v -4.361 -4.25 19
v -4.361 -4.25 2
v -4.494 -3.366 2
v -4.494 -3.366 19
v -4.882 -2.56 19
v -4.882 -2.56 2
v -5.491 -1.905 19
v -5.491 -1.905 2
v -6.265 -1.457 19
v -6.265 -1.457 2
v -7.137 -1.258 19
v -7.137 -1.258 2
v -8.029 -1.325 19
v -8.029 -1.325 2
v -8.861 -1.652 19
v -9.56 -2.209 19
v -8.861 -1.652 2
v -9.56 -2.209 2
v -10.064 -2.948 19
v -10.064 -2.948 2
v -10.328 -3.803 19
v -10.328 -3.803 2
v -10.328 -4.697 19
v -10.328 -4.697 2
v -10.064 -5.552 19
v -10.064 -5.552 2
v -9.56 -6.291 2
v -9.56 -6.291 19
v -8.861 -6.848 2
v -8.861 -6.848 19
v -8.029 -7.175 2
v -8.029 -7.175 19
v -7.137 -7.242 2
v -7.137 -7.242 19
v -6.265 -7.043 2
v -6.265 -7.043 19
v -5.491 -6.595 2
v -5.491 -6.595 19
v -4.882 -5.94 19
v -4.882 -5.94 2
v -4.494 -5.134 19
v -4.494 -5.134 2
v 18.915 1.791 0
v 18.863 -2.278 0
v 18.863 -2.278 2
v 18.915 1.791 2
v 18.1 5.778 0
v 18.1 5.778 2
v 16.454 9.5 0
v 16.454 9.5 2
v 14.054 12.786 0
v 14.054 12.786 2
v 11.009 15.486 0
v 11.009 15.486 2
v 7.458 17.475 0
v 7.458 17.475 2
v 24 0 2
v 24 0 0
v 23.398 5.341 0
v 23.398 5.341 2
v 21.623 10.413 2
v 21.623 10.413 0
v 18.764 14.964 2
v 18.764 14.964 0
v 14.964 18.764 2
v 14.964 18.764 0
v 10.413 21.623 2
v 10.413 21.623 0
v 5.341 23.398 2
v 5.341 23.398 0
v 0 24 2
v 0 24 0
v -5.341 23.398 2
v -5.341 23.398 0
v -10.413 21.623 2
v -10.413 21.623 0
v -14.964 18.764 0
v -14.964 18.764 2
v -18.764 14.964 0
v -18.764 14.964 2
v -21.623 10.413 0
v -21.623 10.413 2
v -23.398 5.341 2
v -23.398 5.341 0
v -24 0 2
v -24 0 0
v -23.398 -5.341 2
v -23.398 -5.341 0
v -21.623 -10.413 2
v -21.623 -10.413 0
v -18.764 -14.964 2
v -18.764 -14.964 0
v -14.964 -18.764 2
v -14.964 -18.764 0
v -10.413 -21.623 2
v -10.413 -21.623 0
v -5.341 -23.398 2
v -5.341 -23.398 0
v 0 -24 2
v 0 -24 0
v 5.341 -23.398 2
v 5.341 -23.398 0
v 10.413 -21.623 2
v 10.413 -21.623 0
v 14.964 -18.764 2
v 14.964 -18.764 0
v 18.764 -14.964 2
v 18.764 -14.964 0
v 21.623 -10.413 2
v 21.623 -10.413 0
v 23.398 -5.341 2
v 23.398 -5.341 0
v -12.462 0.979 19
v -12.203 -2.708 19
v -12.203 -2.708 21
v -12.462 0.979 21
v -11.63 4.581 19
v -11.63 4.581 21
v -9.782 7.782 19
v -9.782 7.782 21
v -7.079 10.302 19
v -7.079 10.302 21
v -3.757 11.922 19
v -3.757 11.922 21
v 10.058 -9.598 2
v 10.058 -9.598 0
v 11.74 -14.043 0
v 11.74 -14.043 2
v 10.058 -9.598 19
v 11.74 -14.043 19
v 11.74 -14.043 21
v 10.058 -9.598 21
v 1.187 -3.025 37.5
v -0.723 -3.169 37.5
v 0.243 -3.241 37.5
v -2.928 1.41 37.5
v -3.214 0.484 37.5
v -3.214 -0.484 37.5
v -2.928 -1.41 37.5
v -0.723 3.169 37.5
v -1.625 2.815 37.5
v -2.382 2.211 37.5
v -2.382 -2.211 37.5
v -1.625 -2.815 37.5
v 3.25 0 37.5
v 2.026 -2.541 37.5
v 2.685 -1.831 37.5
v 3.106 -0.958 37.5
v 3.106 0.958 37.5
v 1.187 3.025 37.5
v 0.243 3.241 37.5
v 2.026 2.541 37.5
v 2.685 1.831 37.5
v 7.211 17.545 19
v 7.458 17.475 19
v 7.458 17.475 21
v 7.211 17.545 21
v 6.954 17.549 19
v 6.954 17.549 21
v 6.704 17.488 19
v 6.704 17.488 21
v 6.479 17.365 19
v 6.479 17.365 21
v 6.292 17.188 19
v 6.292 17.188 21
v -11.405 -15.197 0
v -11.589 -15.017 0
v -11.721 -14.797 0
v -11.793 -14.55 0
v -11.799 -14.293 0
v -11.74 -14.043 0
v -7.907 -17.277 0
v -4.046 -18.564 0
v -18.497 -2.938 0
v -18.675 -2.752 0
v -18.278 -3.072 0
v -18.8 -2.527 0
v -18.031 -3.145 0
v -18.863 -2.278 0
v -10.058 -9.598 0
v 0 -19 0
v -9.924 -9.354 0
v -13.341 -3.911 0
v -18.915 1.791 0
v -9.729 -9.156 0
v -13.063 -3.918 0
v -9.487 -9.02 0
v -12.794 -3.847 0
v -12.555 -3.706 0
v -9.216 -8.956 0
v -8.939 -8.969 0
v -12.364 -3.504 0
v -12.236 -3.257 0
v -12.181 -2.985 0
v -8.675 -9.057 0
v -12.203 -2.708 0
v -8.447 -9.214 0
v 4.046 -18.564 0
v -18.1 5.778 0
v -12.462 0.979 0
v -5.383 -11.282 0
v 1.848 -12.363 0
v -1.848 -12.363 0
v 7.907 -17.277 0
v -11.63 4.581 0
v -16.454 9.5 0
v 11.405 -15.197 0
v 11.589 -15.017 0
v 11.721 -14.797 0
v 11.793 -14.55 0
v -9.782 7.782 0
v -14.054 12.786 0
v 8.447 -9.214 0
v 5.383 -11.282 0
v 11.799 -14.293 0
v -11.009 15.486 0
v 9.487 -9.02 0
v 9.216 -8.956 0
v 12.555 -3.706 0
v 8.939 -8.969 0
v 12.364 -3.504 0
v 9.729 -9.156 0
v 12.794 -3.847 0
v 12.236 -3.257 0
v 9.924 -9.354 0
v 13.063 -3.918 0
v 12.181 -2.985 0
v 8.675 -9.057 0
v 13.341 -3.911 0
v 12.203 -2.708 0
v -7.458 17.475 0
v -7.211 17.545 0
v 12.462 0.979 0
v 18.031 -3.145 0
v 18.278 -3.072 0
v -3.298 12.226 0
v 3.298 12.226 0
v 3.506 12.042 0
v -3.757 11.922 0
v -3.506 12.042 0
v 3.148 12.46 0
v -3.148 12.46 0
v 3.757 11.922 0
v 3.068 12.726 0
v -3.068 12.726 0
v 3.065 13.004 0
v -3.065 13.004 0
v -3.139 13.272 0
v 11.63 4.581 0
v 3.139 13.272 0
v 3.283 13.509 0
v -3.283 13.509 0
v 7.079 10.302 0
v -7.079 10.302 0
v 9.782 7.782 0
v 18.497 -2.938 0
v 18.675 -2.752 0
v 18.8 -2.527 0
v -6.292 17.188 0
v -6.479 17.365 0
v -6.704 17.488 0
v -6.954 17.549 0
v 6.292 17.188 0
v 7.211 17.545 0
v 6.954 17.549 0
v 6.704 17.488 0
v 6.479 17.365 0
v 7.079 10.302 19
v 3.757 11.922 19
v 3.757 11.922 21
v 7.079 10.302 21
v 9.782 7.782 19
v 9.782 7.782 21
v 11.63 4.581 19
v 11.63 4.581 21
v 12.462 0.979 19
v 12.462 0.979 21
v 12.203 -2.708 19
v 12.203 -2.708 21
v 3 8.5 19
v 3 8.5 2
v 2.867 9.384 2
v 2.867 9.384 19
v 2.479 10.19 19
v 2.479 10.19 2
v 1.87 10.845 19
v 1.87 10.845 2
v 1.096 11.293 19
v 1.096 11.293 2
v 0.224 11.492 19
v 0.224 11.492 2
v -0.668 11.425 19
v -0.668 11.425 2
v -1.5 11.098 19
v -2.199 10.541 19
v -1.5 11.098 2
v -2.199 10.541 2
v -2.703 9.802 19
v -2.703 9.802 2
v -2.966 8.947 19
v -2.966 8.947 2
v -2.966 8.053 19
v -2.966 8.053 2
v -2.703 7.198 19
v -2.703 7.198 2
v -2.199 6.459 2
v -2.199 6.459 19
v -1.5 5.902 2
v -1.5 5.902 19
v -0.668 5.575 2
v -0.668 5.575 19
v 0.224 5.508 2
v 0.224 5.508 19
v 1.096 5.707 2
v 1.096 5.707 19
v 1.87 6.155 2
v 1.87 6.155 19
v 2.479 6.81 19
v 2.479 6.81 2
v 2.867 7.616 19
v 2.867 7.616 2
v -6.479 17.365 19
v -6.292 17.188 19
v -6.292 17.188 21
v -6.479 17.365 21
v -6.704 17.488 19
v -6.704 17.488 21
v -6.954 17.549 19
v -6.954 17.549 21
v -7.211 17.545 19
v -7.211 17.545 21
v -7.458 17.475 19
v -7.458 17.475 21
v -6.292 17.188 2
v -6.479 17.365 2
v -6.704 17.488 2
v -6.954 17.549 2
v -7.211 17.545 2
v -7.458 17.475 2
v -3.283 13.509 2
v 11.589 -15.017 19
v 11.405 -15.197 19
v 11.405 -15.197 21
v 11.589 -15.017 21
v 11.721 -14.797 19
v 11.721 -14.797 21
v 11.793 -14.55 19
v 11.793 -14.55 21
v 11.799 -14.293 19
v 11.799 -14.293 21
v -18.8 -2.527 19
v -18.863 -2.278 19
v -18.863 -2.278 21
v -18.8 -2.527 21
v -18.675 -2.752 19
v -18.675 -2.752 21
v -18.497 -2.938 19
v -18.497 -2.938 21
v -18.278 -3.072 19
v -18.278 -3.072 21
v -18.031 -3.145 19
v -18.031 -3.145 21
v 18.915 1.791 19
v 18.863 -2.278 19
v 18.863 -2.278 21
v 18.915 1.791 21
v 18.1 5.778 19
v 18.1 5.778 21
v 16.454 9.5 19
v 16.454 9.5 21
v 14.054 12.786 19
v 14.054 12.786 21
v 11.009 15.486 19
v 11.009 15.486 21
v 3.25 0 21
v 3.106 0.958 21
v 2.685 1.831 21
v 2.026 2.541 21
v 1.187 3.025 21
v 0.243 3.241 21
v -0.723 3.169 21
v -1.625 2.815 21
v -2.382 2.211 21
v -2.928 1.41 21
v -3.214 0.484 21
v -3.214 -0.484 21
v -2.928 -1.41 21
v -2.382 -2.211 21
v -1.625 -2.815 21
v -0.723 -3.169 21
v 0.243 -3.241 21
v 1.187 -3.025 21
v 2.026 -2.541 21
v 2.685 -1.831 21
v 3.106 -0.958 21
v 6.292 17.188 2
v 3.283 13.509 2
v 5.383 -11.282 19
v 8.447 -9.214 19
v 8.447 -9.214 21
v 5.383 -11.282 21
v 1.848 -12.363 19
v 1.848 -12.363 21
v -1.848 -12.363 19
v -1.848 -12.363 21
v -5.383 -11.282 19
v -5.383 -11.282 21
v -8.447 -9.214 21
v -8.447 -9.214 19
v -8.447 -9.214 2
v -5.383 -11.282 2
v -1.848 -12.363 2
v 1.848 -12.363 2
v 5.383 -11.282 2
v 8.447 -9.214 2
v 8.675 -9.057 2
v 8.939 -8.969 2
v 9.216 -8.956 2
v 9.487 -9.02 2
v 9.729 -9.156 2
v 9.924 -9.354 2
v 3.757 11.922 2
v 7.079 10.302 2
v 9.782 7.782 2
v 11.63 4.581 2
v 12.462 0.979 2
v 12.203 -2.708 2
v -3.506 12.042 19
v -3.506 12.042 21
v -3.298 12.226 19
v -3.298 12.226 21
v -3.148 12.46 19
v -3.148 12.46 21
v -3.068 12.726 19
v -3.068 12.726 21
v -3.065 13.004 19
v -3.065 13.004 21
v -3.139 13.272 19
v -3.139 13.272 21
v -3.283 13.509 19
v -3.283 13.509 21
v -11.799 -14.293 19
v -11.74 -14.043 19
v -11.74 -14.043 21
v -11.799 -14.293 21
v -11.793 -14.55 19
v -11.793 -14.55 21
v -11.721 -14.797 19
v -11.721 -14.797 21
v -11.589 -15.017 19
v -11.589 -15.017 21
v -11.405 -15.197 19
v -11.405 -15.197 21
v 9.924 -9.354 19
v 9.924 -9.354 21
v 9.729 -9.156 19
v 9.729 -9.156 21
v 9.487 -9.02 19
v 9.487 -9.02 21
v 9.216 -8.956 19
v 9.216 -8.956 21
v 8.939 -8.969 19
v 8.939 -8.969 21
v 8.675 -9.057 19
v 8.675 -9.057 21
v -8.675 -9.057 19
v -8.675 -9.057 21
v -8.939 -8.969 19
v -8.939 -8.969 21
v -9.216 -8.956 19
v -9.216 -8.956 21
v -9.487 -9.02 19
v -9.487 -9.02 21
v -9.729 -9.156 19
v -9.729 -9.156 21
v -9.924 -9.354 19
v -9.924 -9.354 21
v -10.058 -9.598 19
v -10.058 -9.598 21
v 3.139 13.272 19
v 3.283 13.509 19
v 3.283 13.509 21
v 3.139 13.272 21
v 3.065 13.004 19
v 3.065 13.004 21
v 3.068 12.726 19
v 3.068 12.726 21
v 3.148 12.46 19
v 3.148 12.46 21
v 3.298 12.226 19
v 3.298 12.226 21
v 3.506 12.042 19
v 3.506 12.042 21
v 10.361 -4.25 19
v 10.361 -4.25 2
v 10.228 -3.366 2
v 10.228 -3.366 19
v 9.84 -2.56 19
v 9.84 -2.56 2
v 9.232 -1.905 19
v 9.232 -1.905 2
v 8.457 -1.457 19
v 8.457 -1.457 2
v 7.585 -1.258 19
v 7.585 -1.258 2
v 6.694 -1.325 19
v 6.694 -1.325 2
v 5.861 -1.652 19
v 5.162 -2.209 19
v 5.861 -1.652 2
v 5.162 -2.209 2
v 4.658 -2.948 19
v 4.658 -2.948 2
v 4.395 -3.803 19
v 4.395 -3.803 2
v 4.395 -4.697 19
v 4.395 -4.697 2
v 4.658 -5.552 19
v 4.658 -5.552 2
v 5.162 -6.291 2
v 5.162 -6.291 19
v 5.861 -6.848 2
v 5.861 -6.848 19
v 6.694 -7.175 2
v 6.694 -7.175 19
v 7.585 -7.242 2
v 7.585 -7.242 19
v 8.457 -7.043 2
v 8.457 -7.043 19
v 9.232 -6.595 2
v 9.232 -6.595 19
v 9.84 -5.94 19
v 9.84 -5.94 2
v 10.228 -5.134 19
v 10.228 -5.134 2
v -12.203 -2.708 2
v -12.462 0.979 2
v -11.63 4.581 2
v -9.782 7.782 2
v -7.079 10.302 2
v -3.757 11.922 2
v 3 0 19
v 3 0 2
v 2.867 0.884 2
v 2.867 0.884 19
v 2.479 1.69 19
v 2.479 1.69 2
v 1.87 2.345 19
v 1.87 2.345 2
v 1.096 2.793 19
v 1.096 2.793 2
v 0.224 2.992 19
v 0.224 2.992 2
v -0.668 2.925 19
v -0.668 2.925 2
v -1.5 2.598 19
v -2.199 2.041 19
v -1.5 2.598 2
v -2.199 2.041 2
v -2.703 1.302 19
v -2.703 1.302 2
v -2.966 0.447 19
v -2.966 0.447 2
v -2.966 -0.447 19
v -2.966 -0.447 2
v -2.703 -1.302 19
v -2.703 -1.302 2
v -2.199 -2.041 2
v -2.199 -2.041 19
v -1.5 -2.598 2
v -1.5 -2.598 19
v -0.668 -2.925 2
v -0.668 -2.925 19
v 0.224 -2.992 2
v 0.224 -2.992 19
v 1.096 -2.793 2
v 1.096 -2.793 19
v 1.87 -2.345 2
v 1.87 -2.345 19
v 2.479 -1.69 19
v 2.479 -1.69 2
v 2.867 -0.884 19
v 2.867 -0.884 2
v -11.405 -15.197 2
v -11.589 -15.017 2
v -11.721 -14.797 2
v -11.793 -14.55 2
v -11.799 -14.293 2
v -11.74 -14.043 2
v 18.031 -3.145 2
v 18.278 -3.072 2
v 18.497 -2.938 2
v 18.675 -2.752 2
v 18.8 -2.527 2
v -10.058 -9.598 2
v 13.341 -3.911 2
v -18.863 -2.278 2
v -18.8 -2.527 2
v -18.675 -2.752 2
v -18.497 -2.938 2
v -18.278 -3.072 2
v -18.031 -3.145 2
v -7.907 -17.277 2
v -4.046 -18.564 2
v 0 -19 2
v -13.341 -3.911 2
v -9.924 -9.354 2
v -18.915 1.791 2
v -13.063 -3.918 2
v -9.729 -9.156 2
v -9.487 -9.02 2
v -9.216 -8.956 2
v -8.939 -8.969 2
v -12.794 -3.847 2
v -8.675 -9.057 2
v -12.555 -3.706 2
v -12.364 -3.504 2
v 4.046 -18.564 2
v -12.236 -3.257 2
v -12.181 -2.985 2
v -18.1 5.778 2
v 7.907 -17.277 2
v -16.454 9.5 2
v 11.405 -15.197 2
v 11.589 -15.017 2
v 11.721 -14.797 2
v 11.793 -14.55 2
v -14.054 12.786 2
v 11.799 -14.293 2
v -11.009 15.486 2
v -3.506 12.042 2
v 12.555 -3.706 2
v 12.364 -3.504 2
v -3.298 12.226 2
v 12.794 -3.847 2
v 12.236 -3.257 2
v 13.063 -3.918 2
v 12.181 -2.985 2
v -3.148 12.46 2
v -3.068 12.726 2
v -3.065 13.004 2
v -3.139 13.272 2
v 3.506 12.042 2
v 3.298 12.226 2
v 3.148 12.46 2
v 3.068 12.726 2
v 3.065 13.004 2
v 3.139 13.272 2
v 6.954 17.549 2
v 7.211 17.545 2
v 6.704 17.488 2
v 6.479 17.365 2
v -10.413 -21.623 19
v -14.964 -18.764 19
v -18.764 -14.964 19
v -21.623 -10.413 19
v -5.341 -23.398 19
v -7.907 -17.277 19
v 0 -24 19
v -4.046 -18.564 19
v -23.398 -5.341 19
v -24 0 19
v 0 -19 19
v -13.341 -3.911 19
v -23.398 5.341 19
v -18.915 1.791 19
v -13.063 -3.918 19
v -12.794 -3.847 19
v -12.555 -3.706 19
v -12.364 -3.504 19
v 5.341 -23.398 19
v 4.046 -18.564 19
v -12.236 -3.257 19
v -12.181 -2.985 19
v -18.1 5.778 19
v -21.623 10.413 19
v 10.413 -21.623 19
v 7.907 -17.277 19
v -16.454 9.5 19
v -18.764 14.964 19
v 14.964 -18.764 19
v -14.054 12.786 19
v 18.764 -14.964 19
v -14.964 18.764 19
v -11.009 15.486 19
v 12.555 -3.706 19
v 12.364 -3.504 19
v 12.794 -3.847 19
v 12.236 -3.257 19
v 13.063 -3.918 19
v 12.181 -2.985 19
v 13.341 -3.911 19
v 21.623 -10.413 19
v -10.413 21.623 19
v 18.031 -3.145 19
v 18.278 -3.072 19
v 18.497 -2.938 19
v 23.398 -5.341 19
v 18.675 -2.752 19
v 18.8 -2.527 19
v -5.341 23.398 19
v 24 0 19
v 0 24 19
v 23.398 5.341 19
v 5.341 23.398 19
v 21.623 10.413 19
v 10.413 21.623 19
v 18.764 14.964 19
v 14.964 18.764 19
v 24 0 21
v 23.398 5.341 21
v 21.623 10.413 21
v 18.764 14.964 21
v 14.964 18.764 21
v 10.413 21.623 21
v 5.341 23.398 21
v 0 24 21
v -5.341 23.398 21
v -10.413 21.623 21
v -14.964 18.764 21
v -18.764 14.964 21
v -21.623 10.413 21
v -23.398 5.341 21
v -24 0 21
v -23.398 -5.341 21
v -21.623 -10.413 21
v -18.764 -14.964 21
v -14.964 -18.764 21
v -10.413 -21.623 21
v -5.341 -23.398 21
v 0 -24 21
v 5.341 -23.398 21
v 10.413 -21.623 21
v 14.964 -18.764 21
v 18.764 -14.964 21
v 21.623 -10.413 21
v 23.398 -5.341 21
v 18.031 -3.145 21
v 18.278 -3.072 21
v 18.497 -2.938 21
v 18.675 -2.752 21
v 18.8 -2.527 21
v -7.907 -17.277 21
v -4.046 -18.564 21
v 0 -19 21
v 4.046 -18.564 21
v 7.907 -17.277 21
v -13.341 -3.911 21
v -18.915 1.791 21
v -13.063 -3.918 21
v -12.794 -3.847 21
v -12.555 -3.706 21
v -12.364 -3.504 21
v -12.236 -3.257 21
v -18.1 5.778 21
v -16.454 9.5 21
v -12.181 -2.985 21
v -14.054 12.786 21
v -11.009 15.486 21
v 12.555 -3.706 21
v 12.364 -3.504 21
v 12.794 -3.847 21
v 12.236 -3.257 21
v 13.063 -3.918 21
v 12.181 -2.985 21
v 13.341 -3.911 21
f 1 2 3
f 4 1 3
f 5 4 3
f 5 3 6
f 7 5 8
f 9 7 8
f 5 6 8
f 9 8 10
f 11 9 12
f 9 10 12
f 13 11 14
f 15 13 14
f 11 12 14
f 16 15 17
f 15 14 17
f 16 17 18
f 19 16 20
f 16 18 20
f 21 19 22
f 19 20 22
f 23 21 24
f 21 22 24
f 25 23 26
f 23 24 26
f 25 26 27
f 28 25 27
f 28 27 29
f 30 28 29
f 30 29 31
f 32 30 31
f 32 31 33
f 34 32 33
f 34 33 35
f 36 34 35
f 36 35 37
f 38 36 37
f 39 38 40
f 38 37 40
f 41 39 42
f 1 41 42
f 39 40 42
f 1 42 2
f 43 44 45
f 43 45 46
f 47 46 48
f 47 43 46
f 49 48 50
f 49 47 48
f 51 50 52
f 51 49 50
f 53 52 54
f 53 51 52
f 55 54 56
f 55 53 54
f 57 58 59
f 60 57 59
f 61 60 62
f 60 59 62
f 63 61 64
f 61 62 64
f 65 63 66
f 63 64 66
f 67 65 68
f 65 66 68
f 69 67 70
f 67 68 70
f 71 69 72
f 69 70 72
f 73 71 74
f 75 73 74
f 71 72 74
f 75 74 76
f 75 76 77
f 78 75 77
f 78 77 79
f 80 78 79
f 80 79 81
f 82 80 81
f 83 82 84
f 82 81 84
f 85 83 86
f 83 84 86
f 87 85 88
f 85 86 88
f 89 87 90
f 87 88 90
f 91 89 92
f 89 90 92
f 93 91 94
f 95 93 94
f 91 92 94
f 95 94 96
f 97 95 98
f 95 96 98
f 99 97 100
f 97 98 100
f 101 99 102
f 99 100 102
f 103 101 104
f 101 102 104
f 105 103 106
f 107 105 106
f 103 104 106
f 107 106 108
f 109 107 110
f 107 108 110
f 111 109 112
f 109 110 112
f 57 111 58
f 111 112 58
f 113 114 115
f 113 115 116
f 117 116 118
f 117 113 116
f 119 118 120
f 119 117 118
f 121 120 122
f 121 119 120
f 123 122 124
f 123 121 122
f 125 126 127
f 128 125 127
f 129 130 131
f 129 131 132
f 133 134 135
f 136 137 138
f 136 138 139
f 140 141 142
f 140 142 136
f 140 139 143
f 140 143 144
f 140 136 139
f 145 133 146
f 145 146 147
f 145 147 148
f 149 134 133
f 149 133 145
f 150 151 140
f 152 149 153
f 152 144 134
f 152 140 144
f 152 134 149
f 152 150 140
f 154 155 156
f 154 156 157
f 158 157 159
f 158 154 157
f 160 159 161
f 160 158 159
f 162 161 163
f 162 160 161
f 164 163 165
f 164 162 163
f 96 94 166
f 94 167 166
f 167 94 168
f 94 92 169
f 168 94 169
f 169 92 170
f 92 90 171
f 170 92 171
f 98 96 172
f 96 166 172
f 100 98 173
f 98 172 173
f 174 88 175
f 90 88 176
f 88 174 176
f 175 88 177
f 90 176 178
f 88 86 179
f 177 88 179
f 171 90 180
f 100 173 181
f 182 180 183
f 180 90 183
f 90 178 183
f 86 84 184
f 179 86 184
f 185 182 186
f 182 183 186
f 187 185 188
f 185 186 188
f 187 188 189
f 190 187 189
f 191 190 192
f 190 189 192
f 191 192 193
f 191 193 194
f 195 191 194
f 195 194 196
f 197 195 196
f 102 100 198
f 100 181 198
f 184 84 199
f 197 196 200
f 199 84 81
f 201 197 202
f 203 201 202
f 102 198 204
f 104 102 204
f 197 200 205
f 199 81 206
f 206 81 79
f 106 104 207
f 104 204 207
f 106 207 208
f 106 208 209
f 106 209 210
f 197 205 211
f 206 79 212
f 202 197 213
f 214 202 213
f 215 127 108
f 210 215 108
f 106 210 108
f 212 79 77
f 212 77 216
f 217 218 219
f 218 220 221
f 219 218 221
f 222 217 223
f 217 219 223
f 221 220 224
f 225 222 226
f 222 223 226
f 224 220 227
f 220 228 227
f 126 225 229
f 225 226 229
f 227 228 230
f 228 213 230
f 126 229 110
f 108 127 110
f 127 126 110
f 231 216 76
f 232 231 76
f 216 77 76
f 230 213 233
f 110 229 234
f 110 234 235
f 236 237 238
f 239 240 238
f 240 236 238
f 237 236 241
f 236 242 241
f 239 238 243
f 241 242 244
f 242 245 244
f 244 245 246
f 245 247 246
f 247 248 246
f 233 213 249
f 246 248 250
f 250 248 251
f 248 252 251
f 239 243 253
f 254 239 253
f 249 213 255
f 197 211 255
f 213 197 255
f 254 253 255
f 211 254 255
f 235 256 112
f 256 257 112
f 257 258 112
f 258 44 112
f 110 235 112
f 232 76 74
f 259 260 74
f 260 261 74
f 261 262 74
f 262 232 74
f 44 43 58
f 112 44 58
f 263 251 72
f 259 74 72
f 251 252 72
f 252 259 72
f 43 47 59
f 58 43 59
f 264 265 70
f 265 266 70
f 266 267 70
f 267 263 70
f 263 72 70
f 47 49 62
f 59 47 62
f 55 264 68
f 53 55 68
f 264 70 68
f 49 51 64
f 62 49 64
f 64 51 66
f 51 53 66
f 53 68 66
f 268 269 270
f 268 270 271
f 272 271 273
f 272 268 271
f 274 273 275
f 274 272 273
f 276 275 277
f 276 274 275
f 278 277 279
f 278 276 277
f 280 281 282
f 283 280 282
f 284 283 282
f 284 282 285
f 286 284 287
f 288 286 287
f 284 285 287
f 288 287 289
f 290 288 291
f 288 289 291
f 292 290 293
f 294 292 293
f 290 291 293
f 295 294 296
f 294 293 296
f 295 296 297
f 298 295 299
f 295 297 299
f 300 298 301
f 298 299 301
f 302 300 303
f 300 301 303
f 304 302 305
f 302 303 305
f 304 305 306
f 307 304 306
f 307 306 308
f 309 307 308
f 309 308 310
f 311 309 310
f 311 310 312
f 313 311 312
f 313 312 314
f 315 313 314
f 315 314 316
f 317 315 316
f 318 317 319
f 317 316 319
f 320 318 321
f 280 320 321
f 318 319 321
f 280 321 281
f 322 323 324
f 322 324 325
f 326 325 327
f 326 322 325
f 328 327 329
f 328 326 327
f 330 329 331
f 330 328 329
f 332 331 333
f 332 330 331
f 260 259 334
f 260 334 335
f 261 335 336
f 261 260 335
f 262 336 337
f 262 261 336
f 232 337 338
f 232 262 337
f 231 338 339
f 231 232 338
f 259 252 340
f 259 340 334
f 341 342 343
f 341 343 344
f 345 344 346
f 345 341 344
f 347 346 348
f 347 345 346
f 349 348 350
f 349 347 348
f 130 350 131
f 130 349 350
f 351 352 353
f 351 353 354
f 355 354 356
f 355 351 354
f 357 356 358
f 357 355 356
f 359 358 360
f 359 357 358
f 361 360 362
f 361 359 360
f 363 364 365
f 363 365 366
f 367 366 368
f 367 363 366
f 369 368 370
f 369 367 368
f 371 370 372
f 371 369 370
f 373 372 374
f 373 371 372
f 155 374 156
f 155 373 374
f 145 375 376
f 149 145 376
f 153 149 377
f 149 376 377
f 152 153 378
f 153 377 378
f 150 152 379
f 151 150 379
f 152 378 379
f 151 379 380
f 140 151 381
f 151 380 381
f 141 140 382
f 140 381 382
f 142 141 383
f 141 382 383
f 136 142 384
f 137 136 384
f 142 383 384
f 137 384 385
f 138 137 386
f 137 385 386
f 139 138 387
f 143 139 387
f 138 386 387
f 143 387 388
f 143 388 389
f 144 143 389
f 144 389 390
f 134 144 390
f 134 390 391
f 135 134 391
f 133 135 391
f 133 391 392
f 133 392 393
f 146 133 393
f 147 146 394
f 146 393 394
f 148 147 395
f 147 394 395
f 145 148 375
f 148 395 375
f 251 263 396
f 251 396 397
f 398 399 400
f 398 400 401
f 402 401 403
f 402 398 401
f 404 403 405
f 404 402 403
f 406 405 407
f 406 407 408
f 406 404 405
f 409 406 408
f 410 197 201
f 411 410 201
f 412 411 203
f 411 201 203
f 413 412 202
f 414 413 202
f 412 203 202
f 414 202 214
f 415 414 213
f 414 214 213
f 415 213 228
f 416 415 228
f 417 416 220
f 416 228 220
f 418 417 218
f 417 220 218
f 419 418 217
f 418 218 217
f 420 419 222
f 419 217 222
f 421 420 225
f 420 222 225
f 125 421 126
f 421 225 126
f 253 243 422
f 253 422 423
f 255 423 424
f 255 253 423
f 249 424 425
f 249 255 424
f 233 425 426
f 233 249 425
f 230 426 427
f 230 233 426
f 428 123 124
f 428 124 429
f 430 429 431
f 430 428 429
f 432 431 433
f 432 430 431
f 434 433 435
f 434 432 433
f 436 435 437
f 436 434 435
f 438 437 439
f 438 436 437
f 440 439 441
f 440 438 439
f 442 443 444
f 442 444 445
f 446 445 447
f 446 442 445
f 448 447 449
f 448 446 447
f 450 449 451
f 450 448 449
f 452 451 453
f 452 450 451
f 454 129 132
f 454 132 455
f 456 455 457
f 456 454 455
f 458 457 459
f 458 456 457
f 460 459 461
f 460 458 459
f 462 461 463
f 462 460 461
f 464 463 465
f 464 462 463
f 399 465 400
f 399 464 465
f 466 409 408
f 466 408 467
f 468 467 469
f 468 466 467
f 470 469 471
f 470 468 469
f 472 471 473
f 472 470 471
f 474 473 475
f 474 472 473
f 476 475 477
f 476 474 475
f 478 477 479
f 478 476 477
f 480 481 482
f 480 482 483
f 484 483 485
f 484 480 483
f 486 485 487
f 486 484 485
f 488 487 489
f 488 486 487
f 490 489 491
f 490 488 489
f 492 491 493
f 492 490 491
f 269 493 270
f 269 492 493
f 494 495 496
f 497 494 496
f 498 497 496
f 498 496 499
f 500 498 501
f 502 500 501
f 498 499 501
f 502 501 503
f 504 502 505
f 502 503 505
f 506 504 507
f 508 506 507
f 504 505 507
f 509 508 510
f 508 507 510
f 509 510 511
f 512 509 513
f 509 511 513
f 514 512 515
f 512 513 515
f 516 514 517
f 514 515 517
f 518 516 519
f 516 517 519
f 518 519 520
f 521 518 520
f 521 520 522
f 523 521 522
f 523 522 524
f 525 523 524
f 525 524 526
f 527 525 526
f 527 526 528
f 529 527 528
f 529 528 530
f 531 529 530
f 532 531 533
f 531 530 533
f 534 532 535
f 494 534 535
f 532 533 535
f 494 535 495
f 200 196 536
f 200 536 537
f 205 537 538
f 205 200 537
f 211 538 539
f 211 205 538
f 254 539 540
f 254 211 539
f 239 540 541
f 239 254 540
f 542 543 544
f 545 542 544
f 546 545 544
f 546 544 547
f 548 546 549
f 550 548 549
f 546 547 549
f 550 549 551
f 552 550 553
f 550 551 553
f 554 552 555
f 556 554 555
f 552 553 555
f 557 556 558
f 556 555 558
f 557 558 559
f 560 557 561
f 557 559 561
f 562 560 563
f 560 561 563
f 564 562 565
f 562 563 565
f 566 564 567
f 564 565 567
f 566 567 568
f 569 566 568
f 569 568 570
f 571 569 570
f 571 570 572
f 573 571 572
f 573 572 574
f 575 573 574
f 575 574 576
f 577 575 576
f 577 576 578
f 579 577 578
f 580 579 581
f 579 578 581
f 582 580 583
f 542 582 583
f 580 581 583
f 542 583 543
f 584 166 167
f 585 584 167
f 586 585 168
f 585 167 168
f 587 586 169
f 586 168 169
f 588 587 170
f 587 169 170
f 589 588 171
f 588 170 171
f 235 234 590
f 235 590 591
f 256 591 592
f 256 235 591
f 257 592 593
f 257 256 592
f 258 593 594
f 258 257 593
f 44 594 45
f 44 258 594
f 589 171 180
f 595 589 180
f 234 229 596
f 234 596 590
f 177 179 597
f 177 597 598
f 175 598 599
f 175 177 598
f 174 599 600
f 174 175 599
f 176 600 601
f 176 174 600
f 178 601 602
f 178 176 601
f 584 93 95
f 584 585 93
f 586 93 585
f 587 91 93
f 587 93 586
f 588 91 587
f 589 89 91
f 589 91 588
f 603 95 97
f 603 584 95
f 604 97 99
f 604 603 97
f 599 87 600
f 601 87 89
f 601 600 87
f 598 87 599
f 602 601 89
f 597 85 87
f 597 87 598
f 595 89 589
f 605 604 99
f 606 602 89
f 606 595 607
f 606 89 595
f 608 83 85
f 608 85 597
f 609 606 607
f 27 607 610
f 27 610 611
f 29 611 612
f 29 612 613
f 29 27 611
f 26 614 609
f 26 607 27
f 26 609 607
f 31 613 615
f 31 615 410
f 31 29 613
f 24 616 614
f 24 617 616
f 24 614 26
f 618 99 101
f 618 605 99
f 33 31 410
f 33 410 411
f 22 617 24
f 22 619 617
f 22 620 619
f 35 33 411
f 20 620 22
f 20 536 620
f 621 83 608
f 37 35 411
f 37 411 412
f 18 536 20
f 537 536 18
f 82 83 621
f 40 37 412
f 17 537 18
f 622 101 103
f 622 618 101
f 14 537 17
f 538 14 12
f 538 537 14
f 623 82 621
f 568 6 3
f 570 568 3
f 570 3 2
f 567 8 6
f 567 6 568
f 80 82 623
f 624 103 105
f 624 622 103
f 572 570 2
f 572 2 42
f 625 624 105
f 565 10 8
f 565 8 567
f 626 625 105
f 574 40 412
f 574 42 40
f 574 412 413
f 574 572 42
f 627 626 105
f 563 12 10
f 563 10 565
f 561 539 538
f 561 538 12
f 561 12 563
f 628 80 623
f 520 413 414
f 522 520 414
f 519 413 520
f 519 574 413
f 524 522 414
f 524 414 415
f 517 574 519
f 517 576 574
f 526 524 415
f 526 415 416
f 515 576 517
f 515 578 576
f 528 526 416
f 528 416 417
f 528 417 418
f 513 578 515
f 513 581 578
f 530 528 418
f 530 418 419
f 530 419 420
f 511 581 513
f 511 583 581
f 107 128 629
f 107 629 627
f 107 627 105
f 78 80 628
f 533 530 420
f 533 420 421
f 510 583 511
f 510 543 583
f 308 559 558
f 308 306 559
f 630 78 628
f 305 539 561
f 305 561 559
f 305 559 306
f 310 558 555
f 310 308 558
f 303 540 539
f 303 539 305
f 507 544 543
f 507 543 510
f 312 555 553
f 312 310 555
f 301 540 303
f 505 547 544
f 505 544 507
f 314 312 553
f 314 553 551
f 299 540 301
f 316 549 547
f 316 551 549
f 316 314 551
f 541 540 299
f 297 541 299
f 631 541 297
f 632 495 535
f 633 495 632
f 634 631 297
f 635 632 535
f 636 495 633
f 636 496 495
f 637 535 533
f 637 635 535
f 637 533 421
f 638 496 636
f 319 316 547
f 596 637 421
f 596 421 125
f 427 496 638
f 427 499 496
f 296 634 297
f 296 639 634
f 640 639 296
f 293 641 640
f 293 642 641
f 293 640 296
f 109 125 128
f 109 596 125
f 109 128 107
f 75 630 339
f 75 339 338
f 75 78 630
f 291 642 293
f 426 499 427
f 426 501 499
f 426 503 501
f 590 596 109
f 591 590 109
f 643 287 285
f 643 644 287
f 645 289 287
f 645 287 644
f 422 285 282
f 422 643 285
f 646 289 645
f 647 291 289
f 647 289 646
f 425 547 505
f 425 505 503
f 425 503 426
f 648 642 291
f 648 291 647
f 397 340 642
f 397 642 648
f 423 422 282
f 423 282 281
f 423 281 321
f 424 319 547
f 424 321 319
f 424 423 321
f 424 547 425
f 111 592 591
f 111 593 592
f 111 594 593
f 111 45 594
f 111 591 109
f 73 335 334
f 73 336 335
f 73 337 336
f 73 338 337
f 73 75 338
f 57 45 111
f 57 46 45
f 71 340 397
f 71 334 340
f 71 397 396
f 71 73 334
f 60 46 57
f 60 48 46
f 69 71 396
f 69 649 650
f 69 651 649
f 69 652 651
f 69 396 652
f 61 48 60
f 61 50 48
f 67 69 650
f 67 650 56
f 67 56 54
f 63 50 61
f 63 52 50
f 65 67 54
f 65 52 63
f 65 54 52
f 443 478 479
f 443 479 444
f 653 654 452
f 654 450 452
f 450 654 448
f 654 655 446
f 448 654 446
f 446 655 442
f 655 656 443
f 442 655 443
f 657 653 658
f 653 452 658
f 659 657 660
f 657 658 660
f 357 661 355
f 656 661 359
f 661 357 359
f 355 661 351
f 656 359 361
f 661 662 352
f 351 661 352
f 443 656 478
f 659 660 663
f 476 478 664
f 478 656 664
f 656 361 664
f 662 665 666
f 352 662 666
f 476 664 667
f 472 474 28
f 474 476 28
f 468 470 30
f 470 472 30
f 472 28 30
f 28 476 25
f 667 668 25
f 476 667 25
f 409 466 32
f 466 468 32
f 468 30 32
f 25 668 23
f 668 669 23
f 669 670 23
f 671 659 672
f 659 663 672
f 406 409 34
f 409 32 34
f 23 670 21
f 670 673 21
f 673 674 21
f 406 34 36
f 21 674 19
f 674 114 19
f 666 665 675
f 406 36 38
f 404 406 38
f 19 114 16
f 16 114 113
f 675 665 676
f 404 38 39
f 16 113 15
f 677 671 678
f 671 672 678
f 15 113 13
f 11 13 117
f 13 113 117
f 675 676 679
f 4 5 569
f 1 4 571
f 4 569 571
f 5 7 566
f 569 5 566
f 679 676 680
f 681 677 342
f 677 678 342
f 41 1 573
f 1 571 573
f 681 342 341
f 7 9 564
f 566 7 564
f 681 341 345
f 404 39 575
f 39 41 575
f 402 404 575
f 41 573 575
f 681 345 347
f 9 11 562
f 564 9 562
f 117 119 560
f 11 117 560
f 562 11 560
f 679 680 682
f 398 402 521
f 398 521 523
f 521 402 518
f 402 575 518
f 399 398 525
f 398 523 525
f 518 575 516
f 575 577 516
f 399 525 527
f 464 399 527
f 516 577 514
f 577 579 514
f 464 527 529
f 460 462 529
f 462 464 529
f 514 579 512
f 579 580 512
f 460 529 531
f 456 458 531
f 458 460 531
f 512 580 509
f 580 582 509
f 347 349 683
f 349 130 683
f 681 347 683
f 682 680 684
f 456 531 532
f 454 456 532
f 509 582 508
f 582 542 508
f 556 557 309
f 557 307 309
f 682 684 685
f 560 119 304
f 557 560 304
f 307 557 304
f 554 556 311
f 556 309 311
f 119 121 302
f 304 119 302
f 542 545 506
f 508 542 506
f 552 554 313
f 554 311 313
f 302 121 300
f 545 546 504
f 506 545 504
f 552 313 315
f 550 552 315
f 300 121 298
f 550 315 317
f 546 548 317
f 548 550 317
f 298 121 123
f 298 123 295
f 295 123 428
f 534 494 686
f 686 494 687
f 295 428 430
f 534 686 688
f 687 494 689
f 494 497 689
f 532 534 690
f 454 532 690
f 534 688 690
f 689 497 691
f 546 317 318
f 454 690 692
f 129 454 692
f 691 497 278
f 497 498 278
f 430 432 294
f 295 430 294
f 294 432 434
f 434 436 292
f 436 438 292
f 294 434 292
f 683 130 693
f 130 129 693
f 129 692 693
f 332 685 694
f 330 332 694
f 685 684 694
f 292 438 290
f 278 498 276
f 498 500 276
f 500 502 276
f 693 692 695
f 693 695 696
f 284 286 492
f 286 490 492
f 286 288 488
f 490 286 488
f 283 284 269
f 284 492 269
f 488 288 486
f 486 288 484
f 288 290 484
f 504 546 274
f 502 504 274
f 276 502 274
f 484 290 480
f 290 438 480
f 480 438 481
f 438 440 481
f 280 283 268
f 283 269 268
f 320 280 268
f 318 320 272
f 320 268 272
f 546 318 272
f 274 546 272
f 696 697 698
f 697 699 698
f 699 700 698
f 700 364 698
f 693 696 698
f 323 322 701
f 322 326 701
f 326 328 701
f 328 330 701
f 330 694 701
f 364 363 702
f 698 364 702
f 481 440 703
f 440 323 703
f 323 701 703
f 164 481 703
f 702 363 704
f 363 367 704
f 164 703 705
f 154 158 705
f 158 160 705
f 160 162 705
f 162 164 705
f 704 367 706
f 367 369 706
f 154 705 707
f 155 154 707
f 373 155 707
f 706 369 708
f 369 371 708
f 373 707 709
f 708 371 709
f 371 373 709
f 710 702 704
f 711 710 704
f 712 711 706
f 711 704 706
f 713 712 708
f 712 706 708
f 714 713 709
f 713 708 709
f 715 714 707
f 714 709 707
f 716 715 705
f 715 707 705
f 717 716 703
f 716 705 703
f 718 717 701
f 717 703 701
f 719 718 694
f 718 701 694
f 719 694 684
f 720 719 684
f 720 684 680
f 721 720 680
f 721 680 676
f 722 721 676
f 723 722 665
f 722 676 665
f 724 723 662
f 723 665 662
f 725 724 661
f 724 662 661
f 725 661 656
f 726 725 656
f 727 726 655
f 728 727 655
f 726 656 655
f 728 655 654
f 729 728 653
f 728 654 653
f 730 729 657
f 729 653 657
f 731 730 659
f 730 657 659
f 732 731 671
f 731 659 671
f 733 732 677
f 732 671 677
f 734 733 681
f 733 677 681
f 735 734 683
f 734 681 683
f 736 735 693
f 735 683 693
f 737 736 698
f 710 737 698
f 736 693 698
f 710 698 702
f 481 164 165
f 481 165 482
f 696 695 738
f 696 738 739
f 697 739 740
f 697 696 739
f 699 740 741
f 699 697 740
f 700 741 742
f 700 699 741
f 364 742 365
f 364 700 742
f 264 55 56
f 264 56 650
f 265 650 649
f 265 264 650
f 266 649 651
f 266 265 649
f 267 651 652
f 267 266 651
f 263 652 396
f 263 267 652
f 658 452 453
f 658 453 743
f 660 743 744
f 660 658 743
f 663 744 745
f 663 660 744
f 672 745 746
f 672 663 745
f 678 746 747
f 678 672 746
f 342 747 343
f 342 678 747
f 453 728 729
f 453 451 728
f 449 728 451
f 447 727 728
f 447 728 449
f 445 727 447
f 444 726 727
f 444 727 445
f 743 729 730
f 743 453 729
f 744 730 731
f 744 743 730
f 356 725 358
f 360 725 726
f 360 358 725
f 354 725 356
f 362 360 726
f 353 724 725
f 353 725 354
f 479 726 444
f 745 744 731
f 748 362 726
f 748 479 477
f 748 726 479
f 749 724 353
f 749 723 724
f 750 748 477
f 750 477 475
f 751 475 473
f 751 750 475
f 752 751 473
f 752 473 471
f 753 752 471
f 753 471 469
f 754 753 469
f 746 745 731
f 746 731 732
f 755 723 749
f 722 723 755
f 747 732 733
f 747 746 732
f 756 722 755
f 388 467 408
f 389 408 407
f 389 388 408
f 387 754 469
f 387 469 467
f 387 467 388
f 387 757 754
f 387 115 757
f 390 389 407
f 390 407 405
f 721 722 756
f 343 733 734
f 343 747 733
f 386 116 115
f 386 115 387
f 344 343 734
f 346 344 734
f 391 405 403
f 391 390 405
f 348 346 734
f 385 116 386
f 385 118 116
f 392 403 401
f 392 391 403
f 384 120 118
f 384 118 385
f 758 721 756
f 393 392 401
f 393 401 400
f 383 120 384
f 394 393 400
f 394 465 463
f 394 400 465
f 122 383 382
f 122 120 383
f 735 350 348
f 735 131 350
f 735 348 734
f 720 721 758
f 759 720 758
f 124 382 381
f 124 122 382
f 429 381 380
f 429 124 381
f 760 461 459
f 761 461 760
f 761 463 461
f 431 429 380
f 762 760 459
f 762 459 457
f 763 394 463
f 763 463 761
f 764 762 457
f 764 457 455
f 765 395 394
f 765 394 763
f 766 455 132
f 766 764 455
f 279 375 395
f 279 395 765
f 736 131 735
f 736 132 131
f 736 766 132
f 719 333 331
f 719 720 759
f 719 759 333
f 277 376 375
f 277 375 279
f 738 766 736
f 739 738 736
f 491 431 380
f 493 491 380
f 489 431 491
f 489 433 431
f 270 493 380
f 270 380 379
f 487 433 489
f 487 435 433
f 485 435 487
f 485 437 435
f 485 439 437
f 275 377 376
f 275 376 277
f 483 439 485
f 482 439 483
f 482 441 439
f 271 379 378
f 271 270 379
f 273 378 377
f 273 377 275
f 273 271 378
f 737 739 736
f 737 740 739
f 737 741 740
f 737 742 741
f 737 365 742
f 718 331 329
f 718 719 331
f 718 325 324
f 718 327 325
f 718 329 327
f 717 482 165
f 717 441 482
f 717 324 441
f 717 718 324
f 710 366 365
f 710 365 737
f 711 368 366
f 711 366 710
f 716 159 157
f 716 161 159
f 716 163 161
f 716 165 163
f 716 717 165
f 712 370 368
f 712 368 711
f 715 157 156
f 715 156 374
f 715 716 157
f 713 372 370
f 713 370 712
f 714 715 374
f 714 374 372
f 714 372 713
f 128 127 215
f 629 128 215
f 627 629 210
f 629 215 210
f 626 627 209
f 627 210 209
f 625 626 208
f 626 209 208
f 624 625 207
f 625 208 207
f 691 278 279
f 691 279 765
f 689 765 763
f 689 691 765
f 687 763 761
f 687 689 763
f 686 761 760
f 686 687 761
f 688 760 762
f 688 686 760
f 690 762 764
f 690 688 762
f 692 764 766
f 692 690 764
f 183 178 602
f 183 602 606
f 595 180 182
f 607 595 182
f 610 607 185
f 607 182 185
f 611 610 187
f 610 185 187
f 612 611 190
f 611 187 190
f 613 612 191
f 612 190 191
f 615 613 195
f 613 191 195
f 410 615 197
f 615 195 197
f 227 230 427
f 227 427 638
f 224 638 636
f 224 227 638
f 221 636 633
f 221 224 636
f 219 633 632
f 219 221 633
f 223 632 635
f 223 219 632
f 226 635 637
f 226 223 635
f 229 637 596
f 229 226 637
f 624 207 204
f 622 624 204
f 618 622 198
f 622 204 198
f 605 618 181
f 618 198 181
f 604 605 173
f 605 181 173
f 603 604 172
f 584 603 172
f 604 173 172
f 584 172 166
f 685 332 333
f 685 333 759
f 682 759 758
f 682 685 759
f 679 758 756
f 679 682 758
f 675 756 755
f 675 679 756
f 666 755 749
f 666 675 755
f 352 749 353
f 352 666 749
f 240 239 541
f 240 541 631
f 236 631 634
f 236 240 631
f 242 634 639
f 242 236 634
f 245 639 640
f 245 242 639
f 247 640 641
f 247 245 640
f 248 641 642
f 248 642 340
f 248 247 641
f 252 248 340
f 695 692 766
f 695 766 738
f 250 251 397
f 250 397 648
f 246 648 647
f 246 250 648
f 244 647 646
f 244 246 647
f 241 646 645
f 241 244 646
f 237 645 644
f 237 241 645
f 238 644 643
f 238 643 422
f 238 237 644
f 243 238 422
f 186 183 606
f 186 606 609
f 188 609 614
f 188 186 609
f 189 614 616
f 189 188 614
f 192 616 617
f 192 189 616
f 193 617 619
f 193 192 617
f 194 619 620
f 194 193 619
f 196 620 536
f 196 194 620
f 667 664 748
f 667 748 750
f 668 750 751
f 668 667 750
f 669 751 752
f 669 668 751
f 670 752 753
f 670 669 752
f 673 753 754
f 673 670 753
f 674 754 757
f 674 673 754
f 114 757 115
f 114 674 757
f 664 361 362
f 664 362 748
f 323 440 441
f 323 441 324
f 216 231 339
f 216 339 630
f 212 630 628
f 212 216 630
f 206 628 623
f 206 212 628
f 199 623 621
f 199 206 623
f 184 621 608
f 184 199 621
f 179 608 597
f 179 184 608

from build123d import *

# Parameters (mm, degrees)
SKETCH_1_R      = 24
EXTRUDE_1_DEPTH = 2
SKETCH_2_R      = 3
EXTRUDE_2_DEPTH = 17
SKETCH_3_R      = 24
EXTRUDE_3_DEPTH = 2
SKETCH_4_R      = 3.25
EXTRUDE_4_DEPTH = 16.5


with BuildPart() as part:
    # 草图1 → 凸台-拉伸1 (new body)
    with BuildSketch(Plane.XY):
        Circle(SKETCH_1_R)
        with BuildLine():
            Line((-11.739632055, -14.042831804), (-10.057601798, -9.597641998))
            ThreePointArc((-10.057601798, -9.597641998), (-9.353754198, -8.978695741), (-8.446592755, -9.214394762))
            ThreePointArc((-8.446592755, -9.214394762), (0, -12.5), (8.446592755, -9.214394762))
            ThreePointArc((8.446592755, -9.214394762), (9.353754198, -8.978695741), (10.057601798, -9.597641998))
            Line((10.057601798, -9.597641998), (11.739632055, -14.042831804))
            ThreePointArc((11.739632055, -14.042831804), (11.764677024, -14.675613965), (11.404592123, -15.196554824))
            ThreePointArc((11.404592123, -15.196554824), (0, -19), (-11.404592123, -15.196554824))
            ThreePointArc((-11.404592123, -15.196554824), (-11.764677024, -14.675613965), (-11.739632055, -14.042831804))
        make_face(mode=Mode.SUBTRACT)
        with BuildLine():
            Line((-18.03126511, -3.145403689), (-13.340602686, -3.91131766))
            ThreePointArc((-13.340602686, -3.91131766), (-12.452655704, -3.611240886), (-12.203196322, -2.70776652))
            ThreePointArc((-12.203196322, -2.70776652), (-10.825317547, 6.25), (-3.756603567, 11.922161282))
            ThreePointArc((-3.756603567, 11.922161282), (-3.098901506, 12.589936627), (-3.283000887, 13.508959657))
            Line((-3.283000887, 13.508959657), (-6.291633055, 17.188235493))
            ThreePointArc((-6.291633055, 17.188235493), (-6.827115998, 17.526316153), (-7.458306466, 17.47494391))
            ThreePointArc((-7.458306466, 17.47494391), (-16.454482672, 9.5), (-18.862898589, -2.278389086))
            ThreePointArc((-18.862898589, -2.278389086), (-18.591793022, -2.850702188), (-18.03126511, -3.145403689))
        make_face(mode=Mode.SUBTRACT)
        with BuildLine():
            Line((6.291633055, 17.188235493), (3.283000887, 13.508959657))
            ThreePointArc((3.283000887, 13.508959657), (3.098901506, 12.589936627), (3.756603567, 11.922161282))
            ThreePointArc((3.756603567, 11.922161282), (10.825317547, 6.25), (12.203196322, -2.70776652))
            ThreePointArc((12.203196322, -2.70776652), (12.452655704, -3.611240886), (13.340602686, -3.91131766))
            Line((13.340602686, -3.91131766), (18.03126511, -3.145403689))
            ThreePointArc((18.03126511, -3.145403689), (18.591793022, -2.850702188), (18.862898589, -2.278389086))
            ThreePointArc((18.862898589, -2.278389086), (16.454482672, 9.5), (7.458306466, 17.47494391))
            ThreePointArc((7.458306466, 17.47494391), (6.827115998, 17.526316153), (6.291633055, 17.188235493))
        make_face(mode=Mode.SUBTRACT)
    extrude(amount=EXTRUDE_1_DEPTH)

    # 草图2 → 凸台-拉伸2 (add)
    with BuildSketch(Plane.XY.offset(2)):
        Circle(SKETCH_2_R)
        with Locations((0, 8.5)):
            Circle(SKETCH_2_R)
        with Locations((7.361215932, -4.25)):
            Circle(SKETCH_2_R)
        with Locations((-7.361215932, -4.25)):
            Circle(SKETCH_2_R)
    extrude(amount=EXTRUDE_2_DEPTH)

    # 草图3 → 凸台-拉伸3 (add)
    with BuildSketch(Plane.XY.offset(19)):
        Circle(SKETCH_3_R)
        with BuildLine():
            Line((-10.057601798, -9.597641998), (-11.739632055, -14.042831804))
            ThreePointArc((-11.739632055, -14.042831804), (-11.764677024, -14.675613965), (-11.404592123, -15.196554824))
            ThreePointArc((-11.404592123, -15.196554824), (0, -19), (11.404592123, -15.196554824))
            ThreePointArc((11.404592123, -15.196554824), (11.764677024, -14.675613965), (11.739632055, -14.042831804))
            Line((11.739632055, -14.042831804), (10.057601798, -9.597641998))
            ThreePointArc((10.057601798, -9.597641998), (9.353754198, -8.978695741), (8.446592755, -9.214394762))
            ThreePointArc((8.446592755, -9.214394762), (0, -12.5), (-8.446592755, -9.214394762))
            ThreePointArc((-8.446592755, -9.214394762), (-9.353754198, -8.978695741), (-10.057601798, -9.597641998))
        make_face(mode=Mode.SUBTRACT)
        with BuildLine():
            Line((6.291633055, 17.188235493), (3.283000887, 13.508959657))
            ThreePointArc((3.283000887, 13.508959657), (3.098901506, 12.589936627), (3.756603567, 11.922161282))
            ThreePointArc((3.756603567, 11.922161282), (10.825317547, 6.25), (12.203196322, -2.70776652))
            ThreePointArc((12.203196322, -2.70776652), (12.452655704, -3.611240886), (13.340602686, -3.91131766))
            Line((13.340602686, -3.91131766), (18.03126511, -3.145403689))
            ThreePointArc((18.03126511, -3.145403689), (18.591793022, -2.850702188), (18.862898589, -2.278389086))
            ThreePointArc((18.862898589, -2.278389086), (16.454482672, 9.5), (7.458306466, 17.47494391))
            ThreePointArc((7.458306466, 17.47494391), (6.827115998, 17.526316153), (6.291633055, 17.188235493))
        make_face(mode=Mode.SUBTRACT)
        with BuildLine():
            Line((-3.283000887, 13.508959657), (-6.291633055, 17.188235493))
            ThreePointArc((-6.291633055, 17.188235493), (-6.827115998, 17.526316153), (-7.458306466, 17.47494391))
            ThreePointArc((-7.458306466, 17.47494391), (-16.454482672, 9.5), (-18.862898589, -2.278389086))
            ThreePointArc((-18.862898589, -2.278389086), (-18.591793022, -2.850702188), (-18.03126511, -3.145403689))
            Line((-18.03126511, -3.145403689), (-13.340602686, -3.91131766))
            ThreePointArc((-13.340602686, -3.91131766), (-12.452655704, -3.611240886), (-12.203196322, -2.70776652))
            ThreePointArc((-12.203196322, -2.70776652), (-10.825317547, 6.25), (-3.756603567, 11.922161282))
            ThreePointArc((-3.756603567, 11.922161282), (-3.098901506, 12.589936627), (-3.283000887, 13.508959657))
        make_face(mode=Mode.SUBTRACT)
    extrude(amount=EXTRUDE_3_DEPTH)

    # 草图4 → 凸台-拉伸4 (add)
    with BuildSketch(Plane.XY.offset(21)):
        Circle(SKETCH_4_R)
    extrude(amount=EXTRUDE_4_DEPTH)


solid = part.part
